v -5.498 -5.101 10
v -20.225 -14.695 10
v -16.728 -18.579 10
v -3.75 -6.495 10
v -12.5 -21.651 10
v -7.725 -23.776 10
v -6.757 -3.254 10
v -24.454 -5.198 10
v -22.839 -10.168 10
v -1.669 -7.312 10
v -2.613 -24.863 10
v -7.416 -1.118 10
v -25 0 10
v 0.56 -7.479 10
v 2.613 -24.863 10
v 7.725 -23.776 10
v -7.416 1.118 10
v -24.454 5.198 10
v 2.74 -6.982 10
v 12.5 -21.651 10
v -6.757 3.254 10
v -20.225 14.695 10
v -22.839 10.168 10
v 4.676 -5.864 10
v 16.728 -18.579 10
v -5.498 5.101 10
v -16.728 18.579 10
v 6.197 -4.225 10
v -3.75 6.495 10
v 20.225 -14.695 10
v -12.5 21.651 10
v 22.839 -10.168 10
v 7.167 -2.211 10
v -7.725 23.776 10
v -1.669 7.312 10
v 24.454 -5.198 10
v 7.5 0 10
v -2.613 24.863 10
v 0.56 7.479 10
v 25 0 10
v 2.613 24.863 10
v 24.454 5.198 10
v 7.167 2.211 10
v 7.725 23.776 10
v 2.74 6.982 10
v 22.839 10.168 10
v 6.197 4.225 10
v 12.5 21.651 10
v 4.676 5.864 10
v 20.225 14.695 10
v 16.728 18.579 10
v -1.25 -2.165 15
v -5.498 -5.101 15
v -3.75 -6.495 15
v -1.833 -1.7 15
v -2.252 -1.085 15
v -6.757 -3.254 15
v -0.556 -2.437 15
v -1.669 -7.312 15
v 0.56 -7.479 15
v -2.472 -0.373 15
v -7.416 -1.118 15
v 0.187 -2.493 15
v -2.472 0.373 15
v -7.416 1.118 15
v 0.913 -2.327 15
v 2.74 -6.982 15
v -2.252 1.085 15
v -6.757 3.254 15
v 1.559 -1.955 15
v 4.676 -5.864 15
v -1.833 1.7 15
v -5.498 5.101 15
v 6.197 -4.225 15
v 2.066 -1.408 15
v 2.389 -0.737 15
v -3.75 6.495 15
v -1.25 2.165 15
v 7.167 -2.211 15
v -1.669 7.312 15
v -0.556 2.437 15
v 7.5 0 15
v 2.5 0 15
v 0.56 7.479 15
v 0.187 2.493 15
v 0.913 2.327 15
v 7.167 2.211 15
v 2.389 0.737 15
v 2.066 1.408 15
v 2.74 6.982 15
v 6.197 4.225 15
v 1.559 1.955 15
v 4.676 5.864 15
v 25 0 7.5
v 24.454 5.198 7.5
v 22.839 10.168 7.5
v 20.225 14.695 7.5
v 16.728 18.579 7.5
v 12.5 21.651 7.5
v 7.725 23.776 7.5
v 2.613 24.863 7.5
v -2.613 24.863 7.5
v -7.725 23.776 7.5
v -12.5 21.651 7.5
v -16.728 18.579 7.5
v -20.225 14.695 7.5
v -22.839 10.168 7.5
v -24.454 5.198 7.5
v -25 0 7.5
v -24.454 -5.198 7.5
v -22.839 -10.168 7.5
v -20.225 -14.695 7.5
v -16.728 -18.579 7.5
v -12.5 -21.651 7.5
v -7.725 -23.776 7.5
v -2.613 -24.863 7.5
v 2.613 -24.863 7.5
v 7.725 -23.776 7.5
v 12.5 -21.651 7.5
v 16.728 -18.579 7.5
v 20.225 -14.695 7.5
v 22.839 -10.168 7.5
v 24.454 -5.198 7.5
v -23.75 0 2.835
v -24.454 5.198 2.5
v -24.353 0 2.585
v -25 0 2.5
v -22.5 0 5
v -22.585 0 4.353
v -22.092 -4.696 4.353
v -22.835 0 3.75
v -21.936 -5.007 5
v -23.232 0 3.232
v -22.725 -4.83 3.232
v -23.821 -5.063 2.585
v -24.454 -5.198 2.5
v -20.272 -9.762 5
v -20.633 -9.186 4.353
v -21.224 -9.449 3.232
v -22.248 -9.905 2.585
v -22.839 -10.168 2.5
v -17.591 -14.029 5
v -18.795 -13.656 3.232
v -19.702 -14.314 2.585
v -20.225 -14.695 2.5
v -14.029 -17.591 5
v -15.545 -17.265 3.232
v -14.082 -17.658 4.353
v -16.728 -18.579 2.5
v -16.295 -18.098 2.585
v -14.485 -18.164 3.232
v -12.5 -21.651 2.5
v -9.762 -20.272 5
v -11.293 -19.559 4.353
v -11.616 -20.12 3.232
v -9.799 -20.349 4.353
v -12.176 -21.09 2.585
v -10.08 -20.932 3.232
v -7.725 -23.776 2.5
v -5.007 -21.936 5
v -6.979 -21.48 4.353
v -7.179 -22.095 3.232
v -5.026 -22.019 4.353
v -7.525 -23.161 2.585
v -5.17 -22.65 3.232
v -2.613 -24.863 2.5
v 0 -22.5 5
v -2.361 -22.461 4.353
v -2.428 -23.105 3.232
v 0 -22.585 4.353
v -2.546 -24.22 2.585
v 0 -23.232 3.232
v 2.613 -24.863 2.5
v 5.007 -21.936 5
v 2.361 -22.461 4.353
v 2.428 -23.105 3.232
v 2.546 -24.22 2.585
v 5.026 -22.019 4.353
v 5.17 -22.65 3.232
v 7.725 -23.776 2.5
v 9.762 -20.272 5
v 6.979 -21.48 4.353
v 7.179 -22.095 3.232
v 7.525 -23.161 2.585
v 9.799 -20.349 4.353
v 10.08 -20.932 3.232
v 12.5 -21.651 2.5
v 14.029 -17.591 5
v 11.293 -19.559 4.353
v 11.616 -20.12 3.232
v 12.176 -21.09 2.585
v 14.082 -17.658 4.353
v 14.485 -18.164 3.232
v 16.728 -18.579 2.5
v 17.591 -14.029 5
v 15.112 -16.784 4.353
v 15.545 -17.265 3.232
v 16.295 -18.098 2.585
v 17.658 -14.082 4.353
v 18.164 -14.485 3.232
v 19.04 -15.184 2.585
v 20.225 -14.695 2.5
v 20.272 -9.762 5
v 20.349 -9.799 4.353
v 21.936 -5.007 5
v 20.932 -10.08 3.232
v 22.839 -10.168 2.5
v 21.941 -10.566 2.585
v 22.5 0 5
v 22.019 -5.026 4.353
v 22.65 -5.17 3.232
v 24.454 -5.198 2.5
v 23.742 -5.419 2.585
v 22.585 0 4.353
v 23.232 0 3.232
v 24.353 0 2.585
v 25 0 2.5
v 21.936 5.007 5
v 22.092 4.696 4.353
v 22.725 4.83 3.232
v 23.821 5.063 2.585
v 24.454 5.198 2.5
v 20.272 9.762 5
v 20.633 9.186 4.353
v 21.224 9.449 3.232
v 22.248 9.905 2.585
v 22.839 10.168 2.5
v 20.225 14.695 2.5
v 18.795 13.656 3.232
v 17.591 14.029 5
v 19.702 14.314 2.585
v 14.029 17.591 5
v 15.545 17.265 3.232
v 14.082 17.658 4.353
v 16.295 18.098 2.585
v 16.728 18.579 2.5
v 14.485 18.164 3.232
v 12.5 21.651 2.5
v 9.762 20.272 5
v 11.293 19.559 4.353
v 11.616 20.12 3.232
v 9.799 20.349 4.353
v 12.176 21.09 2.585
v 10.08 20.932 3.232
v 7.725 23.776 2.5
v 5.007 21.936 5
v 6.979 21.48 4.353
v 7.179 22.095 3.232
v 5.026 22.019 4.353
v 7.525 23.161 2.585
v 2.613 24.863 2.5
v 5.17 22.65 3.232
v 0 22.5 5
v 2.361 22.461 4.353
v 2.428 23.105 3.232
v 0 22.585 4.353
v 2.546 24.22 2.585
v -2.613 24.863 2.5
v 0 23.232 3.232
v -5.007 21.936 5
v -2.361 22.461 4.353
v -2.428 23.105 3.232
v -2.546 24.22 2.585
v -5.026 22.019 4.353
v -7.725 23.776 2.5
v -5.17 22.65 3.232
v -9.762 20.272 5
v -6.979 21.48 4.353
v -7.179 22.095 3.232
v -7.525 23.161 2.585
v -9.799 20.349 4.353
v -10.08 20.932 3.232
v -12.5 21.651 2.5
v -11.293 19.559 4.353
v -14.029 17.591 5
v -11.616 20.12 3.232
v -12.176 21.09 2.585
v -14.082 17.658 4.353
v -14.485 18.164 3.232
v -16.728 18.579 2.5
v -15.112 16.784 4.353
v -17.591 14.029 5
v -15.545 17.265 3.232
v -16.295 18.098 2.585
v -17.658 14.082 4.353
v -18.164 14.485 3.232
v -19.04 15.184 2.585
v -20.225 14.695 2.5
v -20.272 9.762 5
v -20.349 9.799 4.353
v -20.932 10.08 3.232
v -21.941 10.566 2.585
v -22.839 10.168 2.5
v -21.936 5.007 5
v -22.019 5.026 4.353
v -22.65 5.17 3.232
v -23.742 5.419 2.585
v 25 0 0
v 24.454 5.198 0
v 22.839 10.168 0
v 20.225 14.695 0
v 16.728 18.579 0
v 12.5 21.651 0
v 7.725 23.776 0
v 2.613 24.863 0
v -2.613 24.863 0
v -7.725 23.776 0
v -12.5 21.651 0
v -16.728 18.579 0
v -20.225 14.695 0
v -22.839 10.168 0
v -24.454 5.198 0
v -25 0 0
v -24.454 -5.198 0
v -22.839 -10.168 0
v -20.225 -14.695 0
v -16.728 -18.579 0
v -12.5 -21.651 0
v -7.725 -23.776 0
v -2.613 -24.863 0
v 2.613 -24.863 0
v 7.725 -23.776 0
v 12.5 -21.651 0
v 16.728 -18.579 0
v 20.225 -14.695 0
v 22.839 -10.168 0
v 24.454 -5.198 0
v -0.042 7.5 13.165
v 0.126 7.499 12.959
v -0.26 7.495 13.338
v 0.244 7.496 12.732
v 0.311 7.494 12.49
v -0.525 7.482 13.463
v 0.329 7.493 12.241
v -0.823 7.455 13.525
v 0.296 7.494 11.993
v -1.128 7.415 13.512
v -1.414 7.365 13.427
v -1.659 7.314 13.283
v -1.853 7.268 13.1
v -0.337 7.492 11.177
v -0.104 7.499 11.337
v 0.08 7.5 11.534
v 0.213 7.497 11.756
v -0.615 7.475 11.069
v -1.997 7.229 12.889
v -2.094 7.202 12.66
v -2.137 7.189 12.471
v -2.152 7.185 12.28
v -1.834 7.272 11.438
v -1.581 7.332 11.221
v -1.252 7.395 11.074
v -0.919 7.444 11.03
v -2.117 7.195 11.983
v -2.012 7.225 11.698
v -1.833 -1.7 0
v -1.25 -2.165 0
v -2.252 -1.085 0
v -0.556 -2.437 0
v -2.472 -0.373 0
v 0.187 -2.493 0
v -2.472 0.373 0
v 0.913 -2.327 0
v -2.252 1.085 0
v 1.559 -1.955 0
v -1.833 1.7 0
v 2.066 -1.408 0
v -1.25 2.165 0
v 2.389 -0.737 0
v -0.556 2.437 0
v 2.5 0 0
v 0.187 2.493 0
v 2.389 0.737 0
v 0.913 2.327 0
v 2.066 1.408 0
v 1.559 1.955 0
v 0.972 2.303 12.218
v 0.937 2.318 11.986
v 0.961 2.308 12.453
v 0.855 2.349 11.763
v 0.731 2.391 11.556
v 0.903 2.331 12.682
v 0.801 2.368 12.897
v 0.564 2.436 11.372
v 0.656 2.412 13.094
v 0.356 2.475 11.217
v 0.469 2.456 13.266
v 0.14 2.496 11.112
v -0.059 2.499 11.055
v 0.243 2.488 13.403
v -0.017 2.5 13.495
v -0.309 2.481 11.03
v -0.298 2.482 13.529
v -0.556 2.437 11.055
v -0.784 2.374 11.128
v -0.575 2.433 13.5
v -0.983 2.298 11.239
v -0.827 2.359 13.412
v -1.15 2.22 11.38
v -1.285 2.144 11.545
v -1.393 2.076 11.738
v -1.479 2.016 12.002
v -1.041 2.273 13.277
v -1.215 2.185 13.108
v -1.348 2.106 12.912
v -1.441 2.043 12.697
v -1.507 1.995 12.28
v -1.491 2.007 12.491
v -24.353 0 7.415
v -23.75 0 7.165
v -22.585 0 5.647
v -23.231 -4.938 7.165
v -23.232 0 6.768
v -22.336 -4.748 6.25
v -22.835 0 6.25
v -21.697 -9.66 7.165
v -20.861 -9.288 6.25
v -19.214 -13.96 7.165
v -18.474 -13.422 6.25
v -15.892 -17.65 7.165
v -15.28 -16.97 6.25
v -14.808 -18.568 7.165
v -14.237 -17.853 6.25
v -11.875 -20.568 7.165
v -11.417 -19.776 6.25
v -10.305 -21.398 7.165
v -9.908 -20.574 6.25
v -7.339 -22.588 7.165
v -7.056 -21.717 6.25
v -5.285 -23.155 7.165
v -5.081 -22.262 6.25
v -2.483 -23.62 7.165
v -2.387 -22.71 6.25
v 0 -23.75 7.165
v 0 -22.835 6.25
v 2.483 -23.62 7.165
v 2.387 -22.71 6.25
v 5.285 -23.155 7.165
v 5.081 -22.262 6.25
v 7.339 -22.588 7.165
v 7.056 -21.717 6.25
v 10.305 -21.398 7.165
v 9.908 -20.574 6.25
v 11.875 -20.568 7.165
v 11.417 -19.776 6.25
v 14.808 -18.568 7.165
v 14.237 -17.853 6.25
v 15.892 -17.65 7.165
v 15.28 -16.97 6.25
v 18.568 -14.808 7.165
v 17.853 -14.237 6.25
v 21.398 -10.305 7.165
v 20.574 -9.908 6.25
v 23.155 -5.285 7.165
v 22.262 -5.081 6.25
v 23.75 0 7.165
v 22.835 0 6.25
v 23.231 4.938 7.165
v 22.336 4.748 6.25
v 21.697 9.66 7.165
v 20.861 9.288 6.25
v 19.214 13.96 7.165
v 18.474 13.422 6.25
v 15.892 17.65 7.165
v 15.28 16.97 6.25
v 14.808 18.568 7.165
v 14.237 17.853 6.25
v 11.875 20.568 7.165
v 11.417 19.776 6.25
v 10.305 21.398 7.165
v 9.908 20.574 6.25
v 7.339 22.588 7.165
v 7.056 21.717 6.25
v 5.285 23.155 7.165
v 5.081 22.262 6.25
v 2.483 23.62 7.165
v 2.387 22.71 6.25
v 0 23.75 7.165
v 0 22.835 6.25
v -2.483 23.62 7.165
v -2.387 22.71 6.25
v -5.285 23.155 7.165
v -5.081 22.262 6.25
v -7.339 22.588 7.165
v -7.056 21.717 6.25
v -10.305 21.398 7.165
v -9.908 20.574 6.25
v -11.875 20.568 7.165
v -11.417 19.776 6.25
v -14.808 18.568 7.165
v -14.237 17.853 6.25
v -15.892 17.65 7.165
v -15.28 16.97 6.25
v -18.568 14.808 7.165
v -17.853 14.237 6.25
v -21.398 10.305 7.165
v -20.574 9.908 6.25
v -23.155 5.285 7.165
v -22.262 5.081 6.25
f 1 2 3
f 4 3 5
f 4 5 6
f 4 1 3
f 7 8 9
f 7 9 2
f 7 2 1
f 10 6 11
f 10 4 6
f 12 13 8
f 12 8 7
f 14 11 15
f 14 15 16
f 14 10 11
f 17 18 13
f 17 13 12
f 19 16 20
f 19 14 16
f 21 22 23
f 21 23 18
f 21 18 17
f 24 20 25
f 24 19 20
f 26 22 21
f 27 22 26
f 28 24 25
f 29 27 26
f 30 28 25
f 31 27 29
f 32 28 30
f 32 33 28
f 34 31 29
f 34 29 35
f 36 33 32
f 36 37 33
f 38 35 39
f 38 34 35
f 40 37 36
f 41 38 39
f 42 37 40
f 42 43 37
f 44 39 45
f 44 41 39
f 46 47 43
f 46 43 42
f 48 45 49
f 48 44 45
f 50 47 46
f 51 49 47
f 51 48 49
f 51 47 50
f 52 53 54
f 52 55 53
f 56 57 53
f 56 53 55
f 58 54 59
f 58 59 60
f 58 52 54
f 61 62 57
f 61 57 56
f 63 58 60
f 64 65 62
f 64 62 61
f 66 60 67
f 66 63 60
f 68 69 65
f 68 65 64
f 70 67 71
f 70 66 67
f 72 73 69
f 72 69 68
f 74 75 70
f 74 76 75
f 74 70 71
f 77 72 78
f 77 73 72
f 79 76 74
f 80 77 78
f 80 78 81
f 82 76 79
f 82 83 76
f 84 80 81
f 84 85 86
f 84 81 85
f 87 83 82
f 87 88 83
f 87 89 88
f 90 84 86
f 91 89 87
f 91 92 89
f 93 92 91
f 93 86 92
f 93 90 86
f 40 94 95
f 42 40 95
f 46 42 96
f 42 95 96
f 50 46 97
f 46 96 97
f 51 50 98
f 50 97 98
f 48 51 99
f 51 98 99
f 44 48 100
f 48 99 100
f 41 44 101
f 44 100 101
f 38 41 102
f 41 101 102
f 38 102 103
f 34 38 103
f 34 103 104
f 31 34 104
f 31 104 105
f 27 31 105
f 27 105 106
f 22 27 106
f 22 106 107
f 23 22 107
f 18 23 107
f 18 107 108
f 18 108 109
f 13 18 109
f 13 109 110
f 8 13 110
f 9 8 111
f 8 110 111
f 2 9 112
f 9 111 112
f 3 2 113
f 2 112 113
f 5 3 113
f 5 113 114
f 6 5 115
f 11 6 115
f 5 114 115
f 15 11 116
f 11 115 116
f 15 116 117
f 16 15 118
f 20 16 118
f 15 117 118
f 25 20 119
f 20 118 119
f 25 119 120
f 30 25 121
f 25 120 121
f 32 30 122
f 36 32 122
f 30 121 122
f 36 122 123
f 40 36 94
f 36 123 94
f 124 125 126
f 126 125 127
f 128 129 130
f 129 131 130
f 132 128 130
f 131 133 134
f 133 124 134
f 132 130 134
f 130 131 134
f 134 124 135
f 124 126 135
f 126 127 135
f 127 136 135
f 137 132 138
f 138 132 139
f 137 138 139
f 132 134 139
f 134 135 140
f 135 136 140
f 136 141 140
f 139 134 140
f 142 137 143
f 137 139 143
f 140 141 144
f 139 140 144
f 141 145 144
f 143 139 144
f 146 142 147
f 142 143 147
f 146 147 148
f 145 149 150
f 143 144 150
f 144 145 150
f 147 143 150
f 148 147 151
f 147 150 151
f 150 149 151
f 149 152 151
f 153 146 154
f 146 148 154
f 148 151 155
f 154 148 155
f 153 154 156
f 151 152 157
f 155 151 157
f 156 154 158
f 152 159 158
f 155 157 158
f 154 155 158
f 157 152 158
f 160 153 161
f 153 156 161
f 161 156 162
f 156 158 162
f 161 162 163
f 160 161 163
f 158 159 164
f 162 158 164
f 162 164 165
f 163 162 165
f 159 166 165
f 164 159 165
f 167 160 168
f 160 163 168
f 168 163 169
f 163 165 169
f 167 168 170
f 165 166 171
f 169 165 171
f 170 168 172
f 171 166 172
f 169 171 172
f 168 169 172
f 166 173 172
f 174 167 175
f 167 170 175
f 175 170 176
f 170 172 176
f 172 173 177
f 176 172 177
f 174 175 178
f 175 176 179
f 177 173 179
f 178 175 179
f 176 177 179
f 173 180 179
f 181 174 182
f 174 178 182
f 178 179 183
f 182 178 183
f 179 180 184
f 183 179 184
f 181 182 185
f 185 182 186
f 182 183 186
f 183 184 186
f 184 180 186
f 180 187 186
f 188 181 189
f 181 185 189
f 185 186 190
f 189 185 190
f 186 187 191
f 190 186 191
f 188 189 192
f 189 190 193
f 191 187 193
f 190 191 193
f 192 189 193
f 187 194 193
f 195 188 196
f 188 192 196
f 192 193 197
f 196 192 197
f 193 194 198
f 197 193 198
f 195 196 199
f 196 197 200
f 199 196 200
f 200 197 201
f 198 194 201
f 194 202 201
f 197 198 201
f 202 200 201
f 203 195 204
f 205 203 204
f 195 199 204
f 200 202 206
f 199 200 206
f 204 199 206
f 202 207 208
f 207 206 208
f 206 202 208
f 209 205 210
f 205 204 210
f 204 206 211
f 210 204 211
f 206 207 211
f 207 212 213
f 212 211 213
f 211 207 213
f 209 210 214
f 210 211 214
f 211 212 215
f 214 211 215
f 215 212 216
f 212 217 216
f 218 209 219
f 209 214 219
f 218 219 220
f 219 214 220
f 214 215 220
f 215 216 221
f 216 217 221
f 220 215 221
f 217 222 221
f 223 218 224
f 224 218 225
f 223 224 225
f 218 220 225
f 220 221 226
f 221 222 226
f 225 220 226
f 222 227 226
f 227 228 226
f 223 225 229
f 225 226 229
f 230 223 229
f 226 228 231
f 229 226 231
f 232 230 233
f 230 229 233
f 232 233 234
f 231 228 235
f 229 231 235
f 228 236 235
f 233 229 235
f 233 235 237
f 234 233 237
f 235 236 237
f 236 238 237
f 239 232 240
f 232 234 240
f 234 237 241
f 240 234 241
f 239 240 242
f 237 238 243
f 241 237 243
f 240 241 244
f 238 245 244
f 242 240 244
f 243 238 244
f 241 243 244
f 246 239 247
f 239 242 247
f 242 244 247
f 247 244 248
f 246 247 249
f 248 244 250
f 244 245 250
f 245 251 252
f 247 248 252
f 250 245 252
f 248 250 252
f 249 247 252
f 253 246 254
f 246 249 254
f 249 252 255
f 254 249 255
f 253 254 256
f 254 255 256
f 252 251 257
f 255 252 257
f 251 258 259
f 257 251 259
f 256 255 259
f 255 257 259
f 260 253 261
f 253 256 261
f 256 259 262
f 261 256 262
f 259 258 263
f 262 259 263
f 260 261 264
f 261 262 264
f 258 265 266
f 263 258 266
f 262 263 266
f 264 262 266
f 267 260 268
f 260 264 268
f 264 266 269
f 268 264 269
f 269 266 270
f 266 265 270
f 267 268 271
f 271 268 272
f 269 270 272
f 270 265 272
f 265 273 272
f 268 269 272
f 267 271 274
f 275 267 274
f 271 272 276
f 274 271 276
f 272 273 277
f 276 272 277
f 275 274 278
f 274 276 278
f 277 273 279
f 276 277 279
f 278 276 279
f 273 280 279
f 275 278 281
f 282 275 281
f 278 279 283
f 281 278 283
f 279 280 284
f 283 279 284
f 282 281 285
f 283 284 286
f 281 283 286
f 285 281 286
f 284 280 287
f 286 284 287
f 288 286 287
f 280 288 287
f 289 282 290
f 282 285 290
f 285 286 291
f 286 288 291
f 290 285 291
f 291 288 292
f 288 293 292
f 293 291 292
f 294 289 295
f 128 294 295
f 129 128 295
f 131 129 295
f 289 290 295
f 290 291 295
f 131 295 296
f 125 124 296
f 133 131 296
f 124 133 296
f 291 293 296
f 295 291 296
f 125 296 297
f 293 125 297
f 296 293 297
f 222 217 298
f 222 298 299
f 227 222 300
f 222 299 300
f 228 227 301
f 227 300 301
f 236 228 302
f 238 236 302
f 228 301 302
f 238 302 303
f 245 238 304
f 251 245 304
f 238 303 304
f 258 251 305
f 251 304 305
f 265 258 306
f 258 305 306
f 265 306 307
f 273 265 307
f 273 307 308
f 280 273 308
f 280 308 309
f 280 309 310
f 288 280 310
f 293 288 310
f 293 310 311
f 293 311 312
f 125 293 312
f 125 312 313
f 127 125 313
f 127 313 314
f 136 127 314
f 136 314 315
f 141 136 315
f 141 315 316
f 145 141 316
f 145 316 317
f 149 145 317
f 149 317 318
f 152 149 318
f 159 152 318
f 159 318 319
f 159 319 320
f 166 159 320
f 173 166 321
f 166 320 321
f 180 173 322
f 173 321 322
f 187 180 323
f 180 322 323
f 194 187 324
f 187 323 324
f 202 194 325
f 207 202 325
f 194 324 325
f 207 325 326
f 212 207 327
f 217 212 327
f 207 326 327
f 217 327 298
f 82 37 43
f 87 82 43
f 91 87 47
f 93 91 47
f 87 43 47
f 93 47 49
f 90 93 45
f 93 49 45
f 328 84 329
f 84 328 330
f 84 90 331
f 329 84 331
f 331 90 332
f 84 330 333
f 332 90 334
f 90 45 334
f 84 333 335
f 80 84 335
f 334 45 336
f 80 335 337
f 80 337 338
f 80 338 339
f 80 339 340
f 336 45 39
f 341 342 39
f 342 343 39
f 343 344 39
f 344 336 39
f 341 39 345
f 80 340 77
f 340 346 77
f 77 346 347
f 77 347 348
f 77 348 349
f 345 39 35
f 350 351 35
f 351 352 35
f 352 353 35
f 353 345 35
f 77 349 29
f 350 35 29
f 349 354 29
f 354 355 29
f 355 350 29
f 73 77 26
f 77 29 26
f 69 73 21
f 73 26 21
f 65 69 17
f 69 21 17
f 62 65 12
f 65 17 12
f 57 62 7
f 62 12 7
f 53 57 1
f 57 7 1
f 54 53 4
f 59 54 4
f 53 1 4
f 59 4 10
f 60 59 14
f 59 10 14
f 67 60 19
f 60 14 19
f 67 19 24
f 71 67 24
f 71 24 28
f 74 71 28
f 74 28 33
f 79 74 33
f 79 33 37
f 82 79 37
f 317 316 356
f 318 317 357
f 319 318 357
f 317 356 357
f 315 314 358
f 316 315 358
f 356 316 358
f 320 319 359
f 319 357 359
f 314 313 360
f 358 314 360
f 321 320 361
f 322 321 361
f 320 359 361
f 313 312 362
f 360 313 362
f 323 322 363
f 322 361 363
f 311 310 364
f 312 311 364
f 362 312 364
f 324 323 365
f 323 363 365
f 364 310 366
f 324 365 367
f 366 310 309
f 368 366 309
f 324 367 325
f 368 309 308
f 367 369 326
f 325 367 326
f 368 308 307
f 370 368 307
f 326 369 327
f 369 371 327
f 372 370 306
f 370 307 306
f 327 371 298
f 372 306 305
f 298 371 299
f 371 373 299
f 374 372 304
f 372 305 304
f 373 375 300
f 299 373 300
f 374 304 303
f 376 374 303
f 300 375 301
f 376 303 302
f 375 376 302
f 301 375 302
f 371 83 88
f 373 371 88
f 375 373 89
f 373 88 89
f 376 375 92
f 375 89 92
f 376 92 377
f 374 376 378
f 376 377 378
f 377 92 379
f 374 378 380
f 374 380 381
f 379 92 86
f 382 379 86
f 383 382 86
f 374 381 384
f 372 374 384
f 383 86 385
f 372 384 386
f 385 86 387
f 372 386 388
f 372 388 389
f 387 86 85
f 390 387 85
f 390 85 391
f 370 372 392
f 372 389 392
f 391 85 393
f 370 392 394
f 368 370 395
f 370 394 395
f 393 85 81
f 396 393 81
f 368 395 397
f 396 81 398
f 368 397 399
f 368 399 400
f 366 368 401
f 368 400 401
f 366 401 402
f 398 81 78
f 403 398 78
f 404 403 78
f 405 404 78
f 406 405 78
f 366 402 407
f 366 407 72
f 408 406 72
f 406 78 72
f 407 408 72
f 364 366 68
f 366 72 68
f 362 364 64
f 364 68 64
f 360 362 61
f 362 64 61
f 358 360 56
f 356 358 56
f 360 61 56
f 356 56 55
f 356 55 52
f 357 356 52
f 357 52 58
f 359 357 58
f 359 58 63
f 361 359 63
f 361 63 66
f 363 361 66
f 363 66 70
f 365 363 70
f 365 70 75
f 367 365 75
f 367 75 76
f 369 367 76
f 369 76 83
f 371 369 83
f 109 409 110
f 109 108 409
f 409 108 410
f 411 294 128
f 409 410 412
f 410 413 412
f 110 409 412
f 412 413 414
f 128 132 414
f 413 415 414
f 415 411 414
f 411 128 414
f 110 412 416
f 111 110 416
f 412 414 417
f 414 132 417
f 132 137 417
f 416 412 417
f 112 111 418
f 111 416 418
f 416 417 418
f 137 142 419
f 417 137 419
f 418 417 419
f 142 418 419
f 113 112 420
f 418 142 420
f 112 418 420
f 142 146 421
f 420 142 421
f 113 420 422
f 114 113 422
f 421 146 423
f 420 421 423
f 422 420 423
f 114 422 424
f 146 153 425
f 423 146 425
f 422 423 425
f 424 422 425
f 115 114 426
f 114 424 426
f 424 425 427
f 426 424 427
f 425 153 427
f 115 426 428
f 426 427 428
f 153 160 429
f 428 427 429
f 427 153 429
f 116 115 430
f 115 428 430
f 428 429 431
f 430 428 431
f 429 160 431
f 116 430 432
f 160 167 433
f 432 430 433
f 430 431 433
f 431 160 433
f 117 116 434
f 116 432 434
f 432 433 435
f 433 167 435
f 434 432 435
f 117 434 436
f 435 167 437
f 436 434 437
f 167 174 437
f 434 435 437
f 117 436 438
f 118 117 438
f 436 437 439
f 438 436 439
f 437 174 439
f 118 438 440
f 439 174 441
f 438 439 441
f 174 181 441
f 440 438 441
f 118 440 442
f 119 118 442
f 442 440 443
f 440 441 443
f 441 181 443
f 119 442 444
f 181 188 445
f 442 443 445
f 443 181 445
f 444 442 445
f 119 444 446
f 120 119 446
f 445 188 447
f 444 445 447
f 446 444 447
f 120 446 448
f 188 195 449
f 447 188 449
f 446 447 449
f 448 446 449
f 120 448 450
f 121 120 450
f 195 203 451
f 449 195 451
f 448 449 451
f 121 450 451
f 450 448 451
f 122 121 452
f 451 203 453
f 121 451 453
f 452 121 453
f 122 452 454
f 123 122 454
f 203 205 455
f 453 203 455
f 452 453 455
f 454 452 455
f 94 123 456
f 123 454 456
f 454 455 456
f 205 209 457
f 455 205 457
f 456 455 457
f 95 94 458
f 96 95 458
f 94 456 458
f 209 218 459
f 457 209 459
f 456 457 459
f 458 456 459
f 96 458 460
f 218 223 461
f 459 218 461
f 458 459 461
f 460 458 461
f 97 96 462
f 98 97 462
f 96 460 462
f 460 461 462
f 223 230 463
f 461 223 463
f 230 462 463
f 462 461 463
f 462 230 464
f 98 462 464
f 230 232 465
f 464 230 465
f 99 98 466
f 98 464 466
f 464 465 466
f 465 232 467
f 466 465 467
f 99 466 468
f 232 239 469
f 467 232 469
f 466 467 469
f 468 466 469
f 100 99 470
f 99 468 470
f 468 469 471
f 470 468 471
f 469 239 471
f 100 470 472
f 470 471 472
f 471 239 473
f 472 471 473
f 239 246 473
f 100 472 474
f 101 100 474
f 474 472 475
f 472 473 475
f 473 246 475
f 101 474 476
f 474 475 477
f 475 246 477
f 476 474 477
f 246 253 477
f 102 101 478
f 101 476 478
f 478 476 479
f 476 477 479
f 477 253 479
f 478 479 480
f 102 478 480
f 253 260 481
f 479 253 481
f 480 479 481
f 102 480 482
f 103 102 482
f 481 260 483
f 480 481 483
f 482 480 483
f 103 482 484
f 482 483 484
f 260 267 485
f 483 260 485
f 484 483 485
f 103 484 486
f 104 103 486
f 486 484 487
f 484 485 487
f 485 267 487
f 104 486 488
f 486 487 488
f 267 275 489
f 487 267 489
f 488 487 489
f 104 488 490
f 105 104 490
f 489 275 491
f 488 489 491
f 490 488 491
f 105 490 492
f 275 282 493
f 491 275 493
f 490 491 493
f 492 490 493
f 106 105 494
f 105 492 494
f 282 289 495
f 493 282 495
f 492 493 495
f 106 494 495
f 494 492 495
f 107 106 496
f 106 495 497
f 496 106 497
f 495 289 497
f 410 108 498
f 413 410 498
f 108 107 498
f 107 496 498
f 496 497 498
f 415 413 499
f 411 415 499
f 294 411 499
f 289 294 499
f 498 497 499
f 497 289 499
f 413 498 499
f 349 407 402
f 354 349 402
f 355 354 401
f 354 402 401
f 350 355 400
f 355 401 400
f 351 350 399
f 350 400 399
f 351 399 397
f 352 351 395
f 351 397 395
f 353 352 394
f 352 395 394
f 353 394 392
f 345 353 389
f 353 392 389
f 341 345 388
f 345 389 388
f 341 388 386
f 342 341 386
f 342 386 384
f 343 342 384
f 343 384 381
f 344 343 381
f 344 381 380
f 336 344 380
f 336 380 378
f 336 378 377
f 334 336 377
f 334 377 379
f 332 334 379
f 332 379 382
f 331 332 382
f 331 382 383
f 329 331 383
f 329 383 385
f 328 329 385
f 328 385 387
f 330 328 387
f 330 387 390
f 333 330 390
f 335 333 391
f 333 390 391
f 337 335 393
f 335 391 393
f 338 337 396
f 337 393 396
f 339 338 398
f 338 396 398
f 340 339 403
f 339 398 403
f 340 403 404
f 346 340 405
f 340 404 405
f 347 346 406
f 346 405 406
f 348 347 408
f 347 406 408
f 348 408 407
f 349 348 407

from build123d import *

# Parameters (mm, degrees)
ESQUISSE1_R             = 25
BOSS_EXTRU_1_DEPTH      = 10
ESQUISSE2_R             = 2.5
ESQUISSE5_R             = 7.5
BOSS_EXTRU_3_DEPTH      = 5
ESQUISSE6_R             = 2.5
ENL_V_MAT_EXTRU_2_DEPTH = 39.405728739
TROU_TARAUD_M31_D       = 2.5
TROU_TARAUD_M31_DEPTH   = 8.5
TROU_TARAUD_M31_TIP     = 0.751075774


with BuildPart() as part:
    # Esquisse1 → Boss.-Extru.1 (new body)
    with BuildSketch(Plane.XY):
        Circle(ESQUISSE1_R)
    extrude(amount=BOSS_EXTRU_1_DEPTH)

    # Esquisse2 → Enlèvement de matière-Révolution1 (revolve, cut)
    with BuildSketch(Plane(origin=(0, 0, 0), x_dir=(1, 0, 0), z_dir=(0, 1, 0))):
        with Locations((-25, -5)):
            Circle(ESQUISSE2_R)
    revolve(axis=Axis((0, 0, 0), (0, 0, 1)), mode=Mode.SUBTRACT)

    # Esquisse5 → Boss.-Extru.3 (add)
    with BuildSketch(Plane.XY.offset(10)):
        Circle(ESQUISSE5_R)
    extrude(amount=BOSS_EXTRU_3_DEPTH)

    # Esquisse6 → Enlèv. mat.-Extru.2 (cut, through all)
    with BuildSketch(Plane.XY.offset(15)):
        Circle(ESQUISSE6_R)
    extrude(amount=-ENL_V_MAT_EXTRU_2_DEPTH, mode=Mode.SUBTRACT)

    # Trou taraudé M31
    with Locations(Plane(origin=(-0.924122453, 7.442848762, 12.279526522), x_dir=(0.992379834907, 0.123216327128, 0), z_dir=(-0.123216327128, 0.992379834907, 0))):
        with Locations((0, 0)):
            Hole(TROU_TARAUD_M31_D / 2, depth=TROU_TARAUD_M31_DEPTH)
            with Locations((0, 0, -(TROU_TARAUD_M31_DEPTH + TROU_TARAUD_M31_TIP / 2))):  # 118° drill point
                Cone(0, TROU_TARAUD_M31_D / 2, TROU_TARAUD_M31_TIP, mode=Mode.SUBTRACT)


solid = part.part
